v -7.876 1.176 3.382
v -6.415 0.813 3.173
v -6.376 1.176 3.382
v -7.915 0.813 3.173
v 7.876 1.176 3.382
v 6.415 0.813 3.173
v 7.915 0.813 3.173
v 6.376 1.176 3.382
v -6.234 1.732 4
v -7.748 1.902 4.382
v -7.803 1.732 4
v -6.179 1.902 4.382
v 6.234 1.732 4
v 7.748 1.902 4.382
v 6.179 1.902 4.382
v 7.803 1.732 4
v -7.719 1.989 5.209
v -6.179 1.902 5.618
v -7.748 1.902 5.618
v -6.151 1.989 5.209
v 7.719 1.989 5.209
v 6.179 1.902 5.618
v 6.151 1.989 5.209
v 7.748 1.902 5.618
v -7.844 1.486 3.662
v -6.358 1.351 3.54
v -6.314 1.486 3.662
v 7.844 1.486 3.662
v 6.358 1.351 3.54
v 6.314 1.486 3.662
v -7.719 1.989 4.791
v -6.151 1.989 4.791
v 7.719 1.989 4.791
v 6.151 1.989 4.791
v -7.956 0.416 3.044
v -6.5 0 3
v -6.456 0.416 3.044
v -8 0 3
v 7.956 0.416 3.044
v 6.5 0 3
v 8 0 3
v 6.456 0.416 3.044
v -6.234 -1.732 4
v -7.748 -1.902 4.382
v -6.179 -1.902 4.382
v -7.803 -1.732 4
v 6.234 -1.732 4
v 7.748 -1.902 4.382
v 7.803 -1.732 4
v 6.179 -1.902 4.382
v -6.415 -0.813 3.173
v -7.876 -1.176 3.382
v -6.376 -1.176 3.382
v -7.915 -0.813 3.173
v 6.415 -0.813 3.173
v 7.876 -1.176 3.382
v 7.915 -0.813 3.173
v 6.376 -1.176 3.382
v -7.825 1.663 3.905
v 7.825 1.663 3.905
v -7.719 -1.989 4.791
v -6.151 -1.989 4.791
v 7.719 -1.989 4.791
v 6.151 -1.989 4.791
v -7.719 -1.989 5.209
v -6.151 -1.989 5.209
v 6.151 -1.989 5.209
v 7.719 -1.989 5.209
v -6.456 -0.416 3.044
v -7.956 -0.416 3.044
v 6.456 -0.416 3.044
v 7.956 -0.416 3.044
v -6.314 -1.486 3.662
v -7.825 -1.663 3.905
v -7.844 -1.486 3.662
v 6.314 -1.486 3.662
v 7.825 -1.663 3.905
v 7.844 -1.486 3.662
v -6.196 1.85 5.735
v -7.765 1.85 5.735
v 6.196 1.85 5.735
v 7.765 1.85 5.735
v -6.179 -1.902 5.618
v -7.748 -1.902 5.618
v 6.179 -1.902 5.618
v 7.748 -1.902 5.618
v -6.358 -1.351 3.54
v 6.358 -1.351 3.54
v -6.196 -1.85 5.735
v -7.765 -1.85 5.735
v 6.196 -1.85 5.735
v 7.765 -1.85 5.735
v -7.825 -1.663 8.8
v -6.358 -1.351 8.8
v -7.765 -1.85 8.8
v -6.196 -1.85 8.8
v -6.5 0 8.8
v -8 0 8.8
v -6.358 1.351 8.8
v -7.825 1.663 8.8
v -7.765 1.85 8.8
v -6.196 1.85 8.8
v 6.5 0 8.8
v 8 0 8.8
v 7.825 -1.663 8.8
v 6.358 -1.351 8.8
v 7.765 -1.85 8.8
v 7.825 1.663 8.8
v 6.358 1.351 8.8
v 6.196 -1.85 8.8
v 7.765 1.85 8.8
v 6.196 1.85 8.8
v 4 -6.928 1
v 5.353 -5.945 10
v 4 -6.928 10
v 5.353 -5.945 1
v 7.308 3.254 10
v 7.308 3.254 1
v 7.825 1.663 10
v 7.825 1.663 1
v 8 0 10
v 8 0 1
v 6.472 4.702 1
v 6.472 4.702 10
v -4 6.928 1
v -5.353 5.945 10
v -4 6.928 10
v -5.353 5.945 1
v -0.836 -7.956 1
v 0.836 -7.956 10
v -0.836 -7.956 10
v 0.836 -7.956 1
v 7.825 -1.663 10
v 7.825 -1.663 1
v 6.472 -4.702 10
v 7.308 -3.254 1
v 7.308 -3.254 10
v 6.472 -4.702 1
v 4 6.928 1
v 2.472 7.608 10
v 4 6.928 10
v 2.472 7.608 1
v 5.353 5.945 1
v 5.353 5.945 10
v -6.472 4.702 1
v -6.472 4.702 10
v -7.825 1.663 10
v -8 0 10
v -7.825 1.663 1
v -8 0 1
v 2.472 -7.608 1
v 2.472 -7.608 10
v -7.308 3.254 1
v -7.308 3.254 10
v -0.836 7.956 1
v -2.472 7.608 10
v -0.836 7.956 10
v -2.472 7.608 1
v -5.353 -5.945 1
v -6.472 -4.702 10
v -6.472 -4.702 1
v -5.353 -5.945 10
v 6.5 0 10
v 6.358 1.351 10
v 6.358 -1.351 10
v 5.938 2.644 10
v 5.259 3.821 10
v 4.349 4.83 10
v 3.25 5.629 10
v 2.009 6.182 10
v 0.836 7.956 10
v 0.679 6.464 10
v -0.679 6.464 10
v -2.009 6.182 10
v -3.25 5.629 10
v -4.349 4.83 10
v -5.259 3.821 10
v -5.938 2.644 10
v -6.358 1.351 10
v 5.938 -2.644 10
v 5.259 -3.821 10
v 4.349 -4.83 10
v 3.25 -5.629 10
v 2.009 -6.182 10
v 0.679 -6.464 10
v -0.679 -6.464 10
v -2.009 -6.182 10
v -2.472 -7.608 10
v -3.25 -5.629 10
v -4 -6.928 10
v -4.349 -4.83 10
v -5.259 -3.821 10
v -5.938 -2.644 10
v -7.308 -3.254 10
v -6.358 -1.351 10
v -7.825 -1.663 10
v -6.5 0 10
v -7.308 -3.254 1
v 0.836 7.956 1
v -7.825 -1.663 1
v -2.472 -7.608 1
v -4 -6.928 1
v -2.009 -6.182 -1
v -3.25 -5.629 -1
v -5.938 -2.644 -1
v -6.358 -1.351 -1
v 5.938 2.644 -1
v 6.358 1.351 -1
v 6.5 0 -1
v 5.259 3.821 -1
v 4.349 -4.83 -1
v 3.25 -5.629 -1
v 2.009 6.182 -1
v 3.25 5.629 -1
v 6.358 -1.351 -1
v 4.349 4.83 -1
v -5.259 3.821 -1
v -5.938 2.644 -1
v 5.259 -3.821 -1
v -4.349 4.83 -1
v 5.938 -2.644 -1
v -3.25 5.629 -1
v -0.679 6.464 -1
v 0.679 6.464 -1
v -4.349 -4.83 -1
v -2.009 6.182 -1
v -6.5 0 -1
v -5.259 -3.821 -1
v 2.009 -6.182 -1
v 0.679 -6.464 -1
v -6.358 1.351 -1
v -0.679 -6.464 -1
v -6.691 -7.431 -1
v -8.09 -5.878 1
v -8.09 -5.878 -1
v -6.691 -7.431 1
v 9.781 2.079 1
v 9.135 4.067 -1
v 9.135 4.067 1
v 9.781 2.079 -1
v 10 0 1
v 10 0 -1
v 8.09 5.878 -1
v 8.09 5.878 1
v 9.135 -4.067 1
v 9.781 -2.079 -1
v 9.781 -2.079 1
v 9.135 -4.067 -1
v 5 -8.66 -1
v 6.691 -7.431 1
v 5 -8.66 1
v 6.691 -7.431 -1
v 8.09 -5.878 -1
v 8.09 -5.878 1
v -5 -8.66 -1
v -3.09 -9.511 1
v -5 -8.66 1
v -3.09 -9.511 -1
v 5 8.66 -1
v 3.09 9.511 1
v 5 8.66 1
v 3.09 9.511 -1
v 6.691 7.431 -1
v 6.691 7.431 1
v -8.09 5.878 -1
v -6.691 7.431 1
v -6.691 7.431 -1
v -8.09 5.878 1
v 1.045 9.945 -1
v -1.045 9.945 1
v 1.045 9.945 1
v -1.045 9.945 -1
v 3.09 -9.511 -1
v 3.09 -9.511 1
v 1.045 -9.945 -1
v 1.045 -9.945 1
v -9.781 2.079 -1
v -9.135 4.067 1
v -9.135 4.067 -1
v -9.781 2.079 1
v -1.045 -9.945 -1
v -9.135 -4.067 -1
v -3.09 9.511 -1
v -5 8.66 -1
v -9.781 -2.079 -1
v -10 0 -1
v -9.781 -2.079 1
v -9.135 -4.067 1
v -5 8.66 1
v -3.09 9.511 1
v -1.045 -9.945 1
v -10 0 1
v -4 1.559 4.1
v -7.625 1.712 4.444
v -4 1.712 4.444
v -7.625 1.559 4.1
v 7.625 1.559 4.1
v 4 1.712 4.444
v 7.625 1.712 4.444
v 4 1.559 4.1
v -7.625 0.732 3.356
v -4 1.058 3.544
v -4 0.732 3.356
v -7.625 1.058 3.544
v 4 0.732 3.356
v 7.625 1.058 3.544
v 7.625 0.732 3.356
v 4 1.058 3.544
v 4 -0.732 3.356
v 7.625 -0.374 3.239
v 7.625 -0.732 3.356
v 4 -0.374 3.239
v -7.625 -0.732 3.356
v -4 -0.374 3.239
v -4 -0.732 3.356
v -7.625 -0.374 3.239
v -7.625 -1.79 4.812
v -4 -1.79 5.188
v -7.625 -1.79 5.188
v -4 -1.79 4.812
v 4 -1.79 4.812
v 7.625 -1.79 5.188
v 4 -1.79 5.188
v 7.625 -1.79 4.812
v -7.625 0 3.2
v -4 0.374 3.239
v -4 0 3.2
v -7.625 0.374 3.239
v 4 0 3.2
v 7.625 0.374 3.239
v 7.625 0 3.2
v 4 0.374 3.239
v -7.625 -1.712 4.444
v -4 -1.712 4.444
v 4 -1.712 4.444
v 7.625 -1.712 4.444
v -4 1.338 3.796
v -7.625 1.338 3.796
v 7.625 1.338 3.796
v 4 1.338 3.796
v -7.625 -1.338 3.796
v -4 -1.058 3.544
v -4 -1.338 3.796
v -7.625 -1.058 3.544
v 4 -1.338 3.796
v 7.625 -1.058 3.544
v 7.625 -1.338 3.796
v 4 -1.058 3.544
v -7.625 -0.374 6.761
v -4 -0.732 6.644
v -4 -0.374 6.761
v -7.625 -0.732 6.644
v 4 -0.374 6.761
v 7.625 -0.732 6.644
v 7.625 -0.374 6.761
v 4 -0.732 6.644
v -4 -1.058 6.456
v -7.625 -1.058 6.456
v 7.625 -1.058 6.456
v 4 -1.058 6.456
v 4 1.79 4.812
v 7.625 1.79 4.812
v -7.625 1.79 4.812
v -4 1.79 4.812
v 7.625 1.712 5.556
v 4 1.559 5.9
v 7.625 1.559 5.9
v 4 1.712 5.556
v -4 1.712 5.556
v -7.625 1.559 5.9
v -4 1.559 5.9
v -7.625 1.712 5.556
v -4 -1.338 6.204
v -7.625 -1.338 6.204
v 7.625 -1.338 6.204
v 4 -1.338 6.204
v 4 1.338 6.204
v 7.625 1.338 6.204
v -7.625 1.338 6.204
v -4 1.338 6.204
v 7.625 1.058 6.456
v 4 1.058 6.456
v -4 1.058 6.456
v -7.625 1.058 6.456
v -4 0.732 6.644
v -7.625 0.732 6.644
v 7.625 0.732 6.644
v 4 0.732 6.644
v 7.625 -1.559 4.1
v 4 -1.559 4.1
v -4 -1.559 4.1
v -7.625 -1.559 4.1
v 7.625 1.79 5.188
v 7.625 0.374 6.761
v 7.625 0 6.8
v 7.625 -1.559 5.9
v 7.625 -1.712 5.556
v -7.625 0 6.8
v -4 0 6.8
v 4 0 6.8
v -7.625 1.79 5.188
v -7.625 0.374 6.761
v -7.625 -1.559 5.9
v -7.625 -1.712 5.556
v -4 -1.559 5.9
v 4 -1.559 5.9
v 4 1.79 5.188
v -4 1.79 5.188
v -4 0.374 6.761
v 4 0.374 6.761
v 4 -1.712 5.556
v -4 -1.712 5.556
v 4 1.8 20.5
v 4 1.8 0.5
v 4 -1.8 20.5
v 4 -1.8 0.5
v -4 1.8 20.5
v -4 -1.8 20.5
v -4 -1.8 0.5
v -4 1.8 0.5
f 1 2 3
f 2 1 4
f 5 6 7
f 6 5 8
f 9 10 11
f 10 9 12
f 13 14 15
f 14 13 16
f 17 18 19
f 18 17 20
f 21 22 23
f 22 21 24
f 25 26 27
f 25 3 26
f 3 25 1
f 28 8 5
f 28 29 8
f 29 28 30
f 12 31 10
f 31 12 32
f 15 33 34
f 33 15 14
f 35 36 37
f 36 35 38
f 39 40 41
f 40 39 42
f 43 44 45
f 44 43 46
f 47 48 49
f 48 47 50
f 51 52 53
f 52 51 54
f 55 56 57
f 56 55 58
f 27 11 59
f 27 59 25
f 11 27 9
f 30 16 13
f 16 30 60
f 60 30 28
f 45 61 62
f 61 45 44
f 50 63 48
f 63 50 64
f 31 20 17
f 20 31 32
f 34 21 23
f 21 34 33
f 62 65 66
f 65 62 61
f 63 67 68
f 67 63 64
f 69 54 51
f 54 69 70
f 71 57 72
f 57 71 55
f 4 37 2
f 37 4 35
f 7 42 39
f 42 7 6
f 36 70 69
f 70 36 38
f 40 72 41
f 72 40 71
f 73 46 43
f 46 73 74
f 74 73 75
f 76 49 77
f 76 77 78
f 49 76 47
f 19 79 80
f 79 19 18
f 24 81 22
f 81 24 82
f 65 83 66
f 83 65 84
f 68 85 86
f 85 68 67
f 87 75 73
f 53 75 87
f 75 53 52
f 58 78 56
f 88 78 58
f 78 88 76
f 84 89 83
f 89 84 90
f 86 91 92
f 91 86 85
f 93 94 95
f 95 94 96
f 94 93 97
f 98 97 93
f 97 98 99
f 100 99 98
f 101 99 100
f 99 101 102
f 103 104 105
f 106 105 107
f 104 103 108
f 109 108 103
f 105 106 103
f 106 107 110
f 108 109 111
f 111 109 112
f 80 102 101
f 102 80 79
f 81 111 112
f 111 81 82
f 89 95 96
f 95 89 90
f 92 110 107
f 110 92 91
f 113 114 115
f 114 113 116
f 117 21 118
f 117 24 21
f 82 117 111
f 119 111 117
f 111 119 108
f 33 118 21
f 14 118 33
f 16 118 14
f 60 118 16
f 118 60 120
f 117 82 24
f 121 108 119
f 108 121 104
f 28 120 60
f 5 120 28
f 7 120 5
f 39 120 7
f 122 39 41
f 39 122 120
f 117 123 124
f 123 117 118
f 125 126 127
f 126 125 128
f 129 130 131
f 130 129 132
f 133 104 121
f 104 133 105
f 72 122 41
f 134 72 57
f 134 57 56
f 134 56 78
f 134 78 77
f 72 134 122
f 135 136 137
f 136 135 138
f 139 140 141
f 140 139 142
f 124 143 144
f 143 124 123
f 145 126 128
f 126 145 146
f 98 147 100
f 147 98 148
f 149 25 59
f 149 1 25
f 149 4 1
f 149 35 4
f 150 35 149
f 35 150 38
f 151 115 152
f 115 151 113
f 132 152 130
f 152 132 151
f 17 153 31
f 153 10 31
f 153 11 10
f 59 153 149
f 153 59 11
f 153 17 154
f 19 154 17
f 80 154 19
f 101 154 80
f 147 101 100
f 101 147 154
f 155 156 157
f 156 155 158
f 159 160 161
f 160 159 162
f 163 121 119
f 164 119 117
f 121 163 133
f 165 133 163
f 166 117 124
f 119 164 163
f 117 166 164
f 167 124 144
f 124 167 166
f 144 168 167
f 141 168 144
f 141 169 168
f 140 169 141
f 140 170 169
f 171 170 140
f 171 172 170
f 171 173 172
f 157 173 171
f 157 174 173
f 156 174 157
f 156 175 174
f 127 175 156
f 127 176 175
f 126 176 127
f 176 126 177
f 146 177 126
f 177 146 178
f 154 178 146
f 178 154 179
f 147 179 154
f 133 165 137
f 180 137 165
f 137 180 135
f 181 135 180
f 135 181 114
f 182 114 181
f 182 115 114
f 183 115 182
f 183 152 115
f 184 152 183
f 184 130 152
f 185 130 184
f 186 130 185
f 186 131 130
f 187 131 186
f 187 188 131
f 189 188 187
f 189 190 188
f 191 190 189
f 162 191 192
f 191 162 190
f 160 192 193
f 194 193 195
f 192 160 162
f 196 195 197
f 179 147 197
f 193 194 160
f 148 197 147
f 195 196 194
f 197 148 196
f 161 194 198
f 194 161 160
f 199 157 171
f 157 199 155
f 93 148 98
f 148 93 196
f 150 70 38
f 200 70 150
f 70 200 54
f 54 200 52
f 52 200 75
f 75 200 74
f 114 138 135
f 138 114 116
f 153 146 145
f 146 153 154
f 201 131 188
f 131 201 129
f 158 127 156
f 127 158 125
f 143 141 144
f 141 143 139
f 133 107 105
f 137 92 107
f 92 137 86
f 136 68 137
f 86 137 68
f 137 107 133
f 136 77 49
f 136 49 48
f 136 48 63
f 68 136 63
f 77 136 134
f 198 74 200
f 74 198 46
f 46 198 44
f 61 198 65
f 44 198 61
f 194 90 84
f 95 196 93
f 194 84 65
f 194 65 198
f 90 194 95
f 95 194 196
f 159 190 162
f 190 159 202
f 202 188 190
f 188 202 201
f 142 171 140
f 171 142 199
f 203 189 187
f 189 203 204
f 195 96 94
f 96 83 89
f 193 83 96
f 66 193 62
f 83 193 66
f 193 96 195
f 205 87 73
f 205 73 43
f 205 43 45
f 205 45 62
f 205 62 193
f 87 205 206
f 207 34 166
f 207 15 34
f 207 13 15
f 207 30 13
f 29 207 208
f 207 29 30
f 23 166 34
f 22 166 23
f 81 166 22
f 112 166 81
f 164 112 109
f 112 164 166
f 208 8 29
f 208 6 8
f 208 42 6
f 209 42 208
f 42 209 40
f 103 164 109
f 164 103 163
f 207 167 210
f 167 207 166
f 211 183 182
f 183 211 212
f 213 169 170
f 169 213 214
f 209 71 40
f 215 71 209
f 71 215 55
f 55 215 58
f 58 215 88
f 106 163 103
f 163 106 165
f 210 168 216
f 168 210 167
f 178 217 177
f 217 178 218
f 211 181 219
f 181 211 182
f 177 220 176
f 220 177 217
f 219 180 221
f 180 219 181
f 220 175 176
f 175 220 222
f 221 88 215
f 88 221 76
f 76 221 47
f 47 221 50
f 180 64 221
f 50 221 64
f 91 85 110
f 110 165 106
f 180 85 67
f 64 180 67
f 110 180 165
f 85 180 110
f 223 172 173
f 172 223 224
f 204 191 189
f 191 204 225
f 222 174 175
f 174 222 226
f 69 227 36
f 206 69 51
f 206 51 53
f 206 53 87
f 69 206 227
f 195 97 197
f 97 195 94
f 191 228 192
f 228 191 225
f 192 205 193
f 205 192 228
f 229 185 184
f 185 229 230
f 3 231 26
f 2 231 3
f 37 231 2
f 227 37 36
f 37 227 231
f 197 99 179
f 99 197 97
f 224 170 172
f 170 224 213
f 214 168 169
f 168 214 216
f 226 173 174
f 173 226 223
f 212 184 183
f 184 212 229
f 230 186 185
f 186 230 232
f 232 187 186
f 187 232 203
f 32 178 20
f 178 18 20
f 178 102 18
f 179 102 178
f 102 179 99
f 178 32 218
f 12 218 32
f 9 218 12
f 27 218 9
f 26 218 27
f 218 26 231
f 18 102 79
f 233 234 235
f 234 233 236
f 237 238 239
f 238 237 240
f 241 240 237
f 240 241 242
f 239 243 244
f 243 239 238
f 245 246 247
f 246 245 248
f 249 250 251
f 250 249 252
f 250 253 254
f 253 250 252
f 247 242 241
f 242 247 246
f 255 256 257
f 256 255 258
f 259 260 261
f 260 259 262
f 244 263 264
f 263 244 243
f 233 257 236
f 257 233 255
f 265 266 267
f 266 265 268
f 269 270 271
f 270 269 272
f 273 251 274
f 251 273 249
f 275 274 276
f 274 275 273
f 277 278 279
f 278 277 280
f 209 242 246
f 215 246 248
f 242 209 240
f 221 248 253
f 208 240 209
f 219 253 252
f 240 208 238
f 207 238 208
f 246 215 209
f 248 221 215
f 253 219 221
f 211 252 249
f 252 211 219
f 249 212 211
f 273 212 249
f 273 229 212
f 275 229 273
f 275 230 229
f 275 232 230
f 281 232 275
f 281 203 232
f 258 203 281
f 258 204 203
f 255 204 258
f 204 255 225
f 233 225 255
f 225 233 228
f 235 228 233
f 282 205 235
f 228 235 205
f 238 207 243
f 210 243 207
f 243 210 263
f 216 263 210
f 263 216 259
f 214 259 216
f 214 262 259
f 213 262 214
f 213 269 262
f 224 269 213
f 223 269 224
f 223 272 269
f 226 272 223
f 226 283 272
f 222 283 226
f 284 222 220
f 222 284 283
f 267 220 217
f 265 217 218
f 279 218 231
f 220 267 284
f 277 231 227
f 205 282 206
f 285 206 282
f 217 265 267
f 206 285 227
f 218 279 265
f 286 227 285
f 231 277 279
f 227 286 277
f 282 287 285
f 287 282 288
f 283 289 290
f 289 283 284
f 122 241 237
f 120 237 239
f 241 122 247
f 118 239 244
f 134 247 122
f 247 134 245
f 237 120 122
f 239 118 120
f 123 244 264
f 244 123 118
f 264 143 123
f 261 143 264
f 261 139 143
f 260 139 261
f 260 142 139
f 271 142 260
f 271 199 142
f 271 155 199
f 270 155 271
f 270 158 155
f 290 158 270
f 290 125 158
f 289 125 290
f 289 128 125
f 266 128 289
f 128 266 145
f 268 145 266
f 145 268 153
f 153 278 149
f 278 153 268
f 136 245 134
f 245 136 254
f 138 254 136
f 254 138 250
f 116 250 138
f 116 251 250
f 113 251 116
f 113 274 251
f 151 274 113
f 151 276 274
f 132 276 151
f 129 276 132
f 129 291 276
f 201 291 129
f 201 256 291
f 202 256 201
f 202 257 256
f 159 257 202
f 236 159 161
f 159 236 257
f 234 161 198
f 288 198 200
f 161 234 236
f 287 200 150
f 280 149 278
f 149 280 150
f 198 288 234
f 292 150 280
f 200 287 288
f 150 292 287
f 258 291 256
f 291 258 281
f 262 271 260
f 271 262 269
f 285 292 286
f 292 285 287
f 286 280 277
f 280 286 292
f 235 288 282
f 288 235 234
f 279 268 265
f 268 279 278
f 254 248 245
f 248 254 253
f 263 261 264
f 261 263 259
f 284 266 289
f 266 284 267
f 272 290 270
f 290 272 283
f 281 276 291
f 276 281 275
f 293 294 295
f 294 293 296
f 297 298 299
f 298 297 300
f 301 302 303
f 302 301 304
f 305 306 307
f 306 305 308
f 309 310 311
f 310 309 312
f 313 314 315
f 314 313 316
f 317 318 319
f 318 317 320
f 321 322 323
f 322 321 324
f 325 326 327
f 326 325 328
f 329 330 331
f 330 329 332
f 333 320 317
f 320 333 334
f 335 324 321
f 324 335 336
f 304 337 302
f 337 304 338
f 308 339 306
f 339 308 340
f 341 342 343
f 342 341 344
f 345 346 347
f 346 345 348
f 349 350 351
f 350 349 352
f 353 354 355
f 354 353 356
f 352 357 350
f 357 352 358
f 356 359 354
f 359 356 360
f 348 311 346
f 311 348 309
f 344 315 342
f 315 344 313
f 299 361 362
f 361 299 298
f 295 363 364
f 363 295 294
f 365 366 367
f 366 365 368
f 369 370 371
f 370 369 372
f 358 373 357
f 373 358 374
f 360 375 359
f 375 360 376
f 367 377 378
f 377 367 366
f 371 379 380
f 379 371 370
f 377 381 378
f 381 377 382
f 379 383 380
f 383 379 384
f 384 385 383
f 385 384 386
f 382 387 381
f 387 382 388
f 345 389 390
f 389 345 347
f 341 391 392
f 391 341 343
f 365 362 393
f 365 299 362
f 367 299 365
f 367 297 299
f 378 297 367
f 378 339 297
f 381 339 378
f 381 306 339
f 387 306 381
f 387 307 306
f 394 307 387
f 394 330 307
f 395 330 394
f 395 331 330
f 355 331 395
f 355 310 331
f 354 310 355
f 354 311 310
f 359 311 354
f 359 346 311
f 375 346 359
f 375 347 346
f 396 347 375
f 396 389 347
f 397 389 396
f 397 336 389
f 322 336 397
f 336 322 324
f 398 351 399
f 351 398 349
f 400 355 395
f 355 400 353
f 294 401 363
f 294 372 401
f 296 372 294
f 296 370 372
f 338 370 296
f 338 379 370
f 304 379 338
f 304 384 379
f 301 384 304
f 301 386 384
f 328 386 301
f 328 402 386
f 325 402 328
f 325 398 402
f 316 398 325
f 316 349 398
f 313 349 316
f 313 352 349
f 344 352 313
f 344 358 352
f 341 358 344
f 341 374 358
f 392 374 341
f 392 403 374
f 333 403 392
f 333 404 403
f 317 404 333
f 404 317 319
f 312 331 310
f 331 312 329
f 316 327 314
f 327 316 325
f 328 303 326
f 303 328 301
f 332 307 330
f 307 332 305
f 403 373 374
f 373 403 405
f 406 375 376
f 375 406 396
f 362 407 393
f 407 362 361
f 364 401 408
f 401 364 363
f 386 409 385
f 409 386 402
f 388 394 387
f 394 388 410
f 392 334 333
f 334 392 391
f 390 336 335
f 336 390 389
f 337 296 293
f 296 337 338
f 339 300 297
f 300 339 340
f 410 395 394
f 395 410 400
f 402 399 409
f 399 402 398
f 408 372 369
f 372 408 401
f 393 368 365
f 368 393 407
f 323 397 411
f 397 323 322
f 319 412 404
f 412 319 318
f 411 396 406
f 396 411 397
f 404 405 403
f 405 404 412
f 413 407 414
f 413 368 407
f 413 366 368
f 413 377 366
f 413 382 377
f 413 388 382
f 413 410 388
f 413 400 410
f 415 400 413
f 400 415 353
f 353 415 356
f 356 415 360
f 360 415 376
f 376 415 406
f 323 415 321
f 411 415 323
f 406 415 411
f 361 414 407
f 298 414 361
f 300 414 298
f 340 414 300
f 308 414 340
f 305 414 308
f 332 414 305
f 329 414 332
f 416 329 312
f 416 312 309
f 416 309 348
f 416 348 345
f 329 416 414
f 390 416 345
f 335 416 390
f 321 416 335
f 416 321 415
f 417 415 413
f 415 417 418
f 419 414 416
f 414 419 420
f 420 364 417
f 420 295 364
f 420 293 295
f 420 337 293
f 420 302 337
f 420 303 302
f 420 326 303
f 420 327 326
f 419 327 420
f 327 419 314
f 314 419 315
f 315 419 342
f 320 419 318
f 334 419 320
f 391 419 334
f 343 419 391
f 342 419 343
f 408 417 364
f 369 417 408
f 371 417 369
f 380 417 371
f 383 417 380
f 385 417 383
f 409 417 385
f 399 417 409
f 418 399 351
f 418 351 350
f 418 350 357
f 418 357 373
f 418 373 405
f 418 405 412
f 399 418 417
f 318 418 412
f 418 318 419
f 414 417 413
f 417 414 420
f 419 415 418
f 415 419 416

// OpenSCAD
h1 = 10;
h2 = 4;
r1 = 8;
r2 = 1.8;
rx = 1.5;
$fn = 30;

drilHole = 1;

shell();

if(drilHole == 1) {
    part1();
}

module part1() {
    union() {
        translate([-r1+rx/4,0,h1/2])
        rotate([0,90,0])
            cylinder(r=r2, h=r1*2-rx/2);
        
        translate([-r1/2,-r2,0.5])
            cube([r1,r2*2,h1*2]);
    }
}

module shell() {
    union() {
        difference() {
            cylinder(r=r1,h=h1);
            
            translate([0,0,-1])
                cylinder(r=r1-rx,h=h1+2);
            
            if(drilHole == 1) {
                translate([-r1*2,0,h1/2])
                    rotate([0,90,0])
                        cylinder(r=2, h=r1*4);
                
                translate([-r1,-r2-0.05,h1/2+0.3])
                    cube([r1*2,r2*2+0.1,h1/2-1.5]);
            }
        }
        difference() {
            translate([0,0,-1])
                cylinder(r=r1+2,h=2);

            translate([0,0,-4])
                cylinder(r=r1-rx,h=h1+2);    
        }
    }
}
